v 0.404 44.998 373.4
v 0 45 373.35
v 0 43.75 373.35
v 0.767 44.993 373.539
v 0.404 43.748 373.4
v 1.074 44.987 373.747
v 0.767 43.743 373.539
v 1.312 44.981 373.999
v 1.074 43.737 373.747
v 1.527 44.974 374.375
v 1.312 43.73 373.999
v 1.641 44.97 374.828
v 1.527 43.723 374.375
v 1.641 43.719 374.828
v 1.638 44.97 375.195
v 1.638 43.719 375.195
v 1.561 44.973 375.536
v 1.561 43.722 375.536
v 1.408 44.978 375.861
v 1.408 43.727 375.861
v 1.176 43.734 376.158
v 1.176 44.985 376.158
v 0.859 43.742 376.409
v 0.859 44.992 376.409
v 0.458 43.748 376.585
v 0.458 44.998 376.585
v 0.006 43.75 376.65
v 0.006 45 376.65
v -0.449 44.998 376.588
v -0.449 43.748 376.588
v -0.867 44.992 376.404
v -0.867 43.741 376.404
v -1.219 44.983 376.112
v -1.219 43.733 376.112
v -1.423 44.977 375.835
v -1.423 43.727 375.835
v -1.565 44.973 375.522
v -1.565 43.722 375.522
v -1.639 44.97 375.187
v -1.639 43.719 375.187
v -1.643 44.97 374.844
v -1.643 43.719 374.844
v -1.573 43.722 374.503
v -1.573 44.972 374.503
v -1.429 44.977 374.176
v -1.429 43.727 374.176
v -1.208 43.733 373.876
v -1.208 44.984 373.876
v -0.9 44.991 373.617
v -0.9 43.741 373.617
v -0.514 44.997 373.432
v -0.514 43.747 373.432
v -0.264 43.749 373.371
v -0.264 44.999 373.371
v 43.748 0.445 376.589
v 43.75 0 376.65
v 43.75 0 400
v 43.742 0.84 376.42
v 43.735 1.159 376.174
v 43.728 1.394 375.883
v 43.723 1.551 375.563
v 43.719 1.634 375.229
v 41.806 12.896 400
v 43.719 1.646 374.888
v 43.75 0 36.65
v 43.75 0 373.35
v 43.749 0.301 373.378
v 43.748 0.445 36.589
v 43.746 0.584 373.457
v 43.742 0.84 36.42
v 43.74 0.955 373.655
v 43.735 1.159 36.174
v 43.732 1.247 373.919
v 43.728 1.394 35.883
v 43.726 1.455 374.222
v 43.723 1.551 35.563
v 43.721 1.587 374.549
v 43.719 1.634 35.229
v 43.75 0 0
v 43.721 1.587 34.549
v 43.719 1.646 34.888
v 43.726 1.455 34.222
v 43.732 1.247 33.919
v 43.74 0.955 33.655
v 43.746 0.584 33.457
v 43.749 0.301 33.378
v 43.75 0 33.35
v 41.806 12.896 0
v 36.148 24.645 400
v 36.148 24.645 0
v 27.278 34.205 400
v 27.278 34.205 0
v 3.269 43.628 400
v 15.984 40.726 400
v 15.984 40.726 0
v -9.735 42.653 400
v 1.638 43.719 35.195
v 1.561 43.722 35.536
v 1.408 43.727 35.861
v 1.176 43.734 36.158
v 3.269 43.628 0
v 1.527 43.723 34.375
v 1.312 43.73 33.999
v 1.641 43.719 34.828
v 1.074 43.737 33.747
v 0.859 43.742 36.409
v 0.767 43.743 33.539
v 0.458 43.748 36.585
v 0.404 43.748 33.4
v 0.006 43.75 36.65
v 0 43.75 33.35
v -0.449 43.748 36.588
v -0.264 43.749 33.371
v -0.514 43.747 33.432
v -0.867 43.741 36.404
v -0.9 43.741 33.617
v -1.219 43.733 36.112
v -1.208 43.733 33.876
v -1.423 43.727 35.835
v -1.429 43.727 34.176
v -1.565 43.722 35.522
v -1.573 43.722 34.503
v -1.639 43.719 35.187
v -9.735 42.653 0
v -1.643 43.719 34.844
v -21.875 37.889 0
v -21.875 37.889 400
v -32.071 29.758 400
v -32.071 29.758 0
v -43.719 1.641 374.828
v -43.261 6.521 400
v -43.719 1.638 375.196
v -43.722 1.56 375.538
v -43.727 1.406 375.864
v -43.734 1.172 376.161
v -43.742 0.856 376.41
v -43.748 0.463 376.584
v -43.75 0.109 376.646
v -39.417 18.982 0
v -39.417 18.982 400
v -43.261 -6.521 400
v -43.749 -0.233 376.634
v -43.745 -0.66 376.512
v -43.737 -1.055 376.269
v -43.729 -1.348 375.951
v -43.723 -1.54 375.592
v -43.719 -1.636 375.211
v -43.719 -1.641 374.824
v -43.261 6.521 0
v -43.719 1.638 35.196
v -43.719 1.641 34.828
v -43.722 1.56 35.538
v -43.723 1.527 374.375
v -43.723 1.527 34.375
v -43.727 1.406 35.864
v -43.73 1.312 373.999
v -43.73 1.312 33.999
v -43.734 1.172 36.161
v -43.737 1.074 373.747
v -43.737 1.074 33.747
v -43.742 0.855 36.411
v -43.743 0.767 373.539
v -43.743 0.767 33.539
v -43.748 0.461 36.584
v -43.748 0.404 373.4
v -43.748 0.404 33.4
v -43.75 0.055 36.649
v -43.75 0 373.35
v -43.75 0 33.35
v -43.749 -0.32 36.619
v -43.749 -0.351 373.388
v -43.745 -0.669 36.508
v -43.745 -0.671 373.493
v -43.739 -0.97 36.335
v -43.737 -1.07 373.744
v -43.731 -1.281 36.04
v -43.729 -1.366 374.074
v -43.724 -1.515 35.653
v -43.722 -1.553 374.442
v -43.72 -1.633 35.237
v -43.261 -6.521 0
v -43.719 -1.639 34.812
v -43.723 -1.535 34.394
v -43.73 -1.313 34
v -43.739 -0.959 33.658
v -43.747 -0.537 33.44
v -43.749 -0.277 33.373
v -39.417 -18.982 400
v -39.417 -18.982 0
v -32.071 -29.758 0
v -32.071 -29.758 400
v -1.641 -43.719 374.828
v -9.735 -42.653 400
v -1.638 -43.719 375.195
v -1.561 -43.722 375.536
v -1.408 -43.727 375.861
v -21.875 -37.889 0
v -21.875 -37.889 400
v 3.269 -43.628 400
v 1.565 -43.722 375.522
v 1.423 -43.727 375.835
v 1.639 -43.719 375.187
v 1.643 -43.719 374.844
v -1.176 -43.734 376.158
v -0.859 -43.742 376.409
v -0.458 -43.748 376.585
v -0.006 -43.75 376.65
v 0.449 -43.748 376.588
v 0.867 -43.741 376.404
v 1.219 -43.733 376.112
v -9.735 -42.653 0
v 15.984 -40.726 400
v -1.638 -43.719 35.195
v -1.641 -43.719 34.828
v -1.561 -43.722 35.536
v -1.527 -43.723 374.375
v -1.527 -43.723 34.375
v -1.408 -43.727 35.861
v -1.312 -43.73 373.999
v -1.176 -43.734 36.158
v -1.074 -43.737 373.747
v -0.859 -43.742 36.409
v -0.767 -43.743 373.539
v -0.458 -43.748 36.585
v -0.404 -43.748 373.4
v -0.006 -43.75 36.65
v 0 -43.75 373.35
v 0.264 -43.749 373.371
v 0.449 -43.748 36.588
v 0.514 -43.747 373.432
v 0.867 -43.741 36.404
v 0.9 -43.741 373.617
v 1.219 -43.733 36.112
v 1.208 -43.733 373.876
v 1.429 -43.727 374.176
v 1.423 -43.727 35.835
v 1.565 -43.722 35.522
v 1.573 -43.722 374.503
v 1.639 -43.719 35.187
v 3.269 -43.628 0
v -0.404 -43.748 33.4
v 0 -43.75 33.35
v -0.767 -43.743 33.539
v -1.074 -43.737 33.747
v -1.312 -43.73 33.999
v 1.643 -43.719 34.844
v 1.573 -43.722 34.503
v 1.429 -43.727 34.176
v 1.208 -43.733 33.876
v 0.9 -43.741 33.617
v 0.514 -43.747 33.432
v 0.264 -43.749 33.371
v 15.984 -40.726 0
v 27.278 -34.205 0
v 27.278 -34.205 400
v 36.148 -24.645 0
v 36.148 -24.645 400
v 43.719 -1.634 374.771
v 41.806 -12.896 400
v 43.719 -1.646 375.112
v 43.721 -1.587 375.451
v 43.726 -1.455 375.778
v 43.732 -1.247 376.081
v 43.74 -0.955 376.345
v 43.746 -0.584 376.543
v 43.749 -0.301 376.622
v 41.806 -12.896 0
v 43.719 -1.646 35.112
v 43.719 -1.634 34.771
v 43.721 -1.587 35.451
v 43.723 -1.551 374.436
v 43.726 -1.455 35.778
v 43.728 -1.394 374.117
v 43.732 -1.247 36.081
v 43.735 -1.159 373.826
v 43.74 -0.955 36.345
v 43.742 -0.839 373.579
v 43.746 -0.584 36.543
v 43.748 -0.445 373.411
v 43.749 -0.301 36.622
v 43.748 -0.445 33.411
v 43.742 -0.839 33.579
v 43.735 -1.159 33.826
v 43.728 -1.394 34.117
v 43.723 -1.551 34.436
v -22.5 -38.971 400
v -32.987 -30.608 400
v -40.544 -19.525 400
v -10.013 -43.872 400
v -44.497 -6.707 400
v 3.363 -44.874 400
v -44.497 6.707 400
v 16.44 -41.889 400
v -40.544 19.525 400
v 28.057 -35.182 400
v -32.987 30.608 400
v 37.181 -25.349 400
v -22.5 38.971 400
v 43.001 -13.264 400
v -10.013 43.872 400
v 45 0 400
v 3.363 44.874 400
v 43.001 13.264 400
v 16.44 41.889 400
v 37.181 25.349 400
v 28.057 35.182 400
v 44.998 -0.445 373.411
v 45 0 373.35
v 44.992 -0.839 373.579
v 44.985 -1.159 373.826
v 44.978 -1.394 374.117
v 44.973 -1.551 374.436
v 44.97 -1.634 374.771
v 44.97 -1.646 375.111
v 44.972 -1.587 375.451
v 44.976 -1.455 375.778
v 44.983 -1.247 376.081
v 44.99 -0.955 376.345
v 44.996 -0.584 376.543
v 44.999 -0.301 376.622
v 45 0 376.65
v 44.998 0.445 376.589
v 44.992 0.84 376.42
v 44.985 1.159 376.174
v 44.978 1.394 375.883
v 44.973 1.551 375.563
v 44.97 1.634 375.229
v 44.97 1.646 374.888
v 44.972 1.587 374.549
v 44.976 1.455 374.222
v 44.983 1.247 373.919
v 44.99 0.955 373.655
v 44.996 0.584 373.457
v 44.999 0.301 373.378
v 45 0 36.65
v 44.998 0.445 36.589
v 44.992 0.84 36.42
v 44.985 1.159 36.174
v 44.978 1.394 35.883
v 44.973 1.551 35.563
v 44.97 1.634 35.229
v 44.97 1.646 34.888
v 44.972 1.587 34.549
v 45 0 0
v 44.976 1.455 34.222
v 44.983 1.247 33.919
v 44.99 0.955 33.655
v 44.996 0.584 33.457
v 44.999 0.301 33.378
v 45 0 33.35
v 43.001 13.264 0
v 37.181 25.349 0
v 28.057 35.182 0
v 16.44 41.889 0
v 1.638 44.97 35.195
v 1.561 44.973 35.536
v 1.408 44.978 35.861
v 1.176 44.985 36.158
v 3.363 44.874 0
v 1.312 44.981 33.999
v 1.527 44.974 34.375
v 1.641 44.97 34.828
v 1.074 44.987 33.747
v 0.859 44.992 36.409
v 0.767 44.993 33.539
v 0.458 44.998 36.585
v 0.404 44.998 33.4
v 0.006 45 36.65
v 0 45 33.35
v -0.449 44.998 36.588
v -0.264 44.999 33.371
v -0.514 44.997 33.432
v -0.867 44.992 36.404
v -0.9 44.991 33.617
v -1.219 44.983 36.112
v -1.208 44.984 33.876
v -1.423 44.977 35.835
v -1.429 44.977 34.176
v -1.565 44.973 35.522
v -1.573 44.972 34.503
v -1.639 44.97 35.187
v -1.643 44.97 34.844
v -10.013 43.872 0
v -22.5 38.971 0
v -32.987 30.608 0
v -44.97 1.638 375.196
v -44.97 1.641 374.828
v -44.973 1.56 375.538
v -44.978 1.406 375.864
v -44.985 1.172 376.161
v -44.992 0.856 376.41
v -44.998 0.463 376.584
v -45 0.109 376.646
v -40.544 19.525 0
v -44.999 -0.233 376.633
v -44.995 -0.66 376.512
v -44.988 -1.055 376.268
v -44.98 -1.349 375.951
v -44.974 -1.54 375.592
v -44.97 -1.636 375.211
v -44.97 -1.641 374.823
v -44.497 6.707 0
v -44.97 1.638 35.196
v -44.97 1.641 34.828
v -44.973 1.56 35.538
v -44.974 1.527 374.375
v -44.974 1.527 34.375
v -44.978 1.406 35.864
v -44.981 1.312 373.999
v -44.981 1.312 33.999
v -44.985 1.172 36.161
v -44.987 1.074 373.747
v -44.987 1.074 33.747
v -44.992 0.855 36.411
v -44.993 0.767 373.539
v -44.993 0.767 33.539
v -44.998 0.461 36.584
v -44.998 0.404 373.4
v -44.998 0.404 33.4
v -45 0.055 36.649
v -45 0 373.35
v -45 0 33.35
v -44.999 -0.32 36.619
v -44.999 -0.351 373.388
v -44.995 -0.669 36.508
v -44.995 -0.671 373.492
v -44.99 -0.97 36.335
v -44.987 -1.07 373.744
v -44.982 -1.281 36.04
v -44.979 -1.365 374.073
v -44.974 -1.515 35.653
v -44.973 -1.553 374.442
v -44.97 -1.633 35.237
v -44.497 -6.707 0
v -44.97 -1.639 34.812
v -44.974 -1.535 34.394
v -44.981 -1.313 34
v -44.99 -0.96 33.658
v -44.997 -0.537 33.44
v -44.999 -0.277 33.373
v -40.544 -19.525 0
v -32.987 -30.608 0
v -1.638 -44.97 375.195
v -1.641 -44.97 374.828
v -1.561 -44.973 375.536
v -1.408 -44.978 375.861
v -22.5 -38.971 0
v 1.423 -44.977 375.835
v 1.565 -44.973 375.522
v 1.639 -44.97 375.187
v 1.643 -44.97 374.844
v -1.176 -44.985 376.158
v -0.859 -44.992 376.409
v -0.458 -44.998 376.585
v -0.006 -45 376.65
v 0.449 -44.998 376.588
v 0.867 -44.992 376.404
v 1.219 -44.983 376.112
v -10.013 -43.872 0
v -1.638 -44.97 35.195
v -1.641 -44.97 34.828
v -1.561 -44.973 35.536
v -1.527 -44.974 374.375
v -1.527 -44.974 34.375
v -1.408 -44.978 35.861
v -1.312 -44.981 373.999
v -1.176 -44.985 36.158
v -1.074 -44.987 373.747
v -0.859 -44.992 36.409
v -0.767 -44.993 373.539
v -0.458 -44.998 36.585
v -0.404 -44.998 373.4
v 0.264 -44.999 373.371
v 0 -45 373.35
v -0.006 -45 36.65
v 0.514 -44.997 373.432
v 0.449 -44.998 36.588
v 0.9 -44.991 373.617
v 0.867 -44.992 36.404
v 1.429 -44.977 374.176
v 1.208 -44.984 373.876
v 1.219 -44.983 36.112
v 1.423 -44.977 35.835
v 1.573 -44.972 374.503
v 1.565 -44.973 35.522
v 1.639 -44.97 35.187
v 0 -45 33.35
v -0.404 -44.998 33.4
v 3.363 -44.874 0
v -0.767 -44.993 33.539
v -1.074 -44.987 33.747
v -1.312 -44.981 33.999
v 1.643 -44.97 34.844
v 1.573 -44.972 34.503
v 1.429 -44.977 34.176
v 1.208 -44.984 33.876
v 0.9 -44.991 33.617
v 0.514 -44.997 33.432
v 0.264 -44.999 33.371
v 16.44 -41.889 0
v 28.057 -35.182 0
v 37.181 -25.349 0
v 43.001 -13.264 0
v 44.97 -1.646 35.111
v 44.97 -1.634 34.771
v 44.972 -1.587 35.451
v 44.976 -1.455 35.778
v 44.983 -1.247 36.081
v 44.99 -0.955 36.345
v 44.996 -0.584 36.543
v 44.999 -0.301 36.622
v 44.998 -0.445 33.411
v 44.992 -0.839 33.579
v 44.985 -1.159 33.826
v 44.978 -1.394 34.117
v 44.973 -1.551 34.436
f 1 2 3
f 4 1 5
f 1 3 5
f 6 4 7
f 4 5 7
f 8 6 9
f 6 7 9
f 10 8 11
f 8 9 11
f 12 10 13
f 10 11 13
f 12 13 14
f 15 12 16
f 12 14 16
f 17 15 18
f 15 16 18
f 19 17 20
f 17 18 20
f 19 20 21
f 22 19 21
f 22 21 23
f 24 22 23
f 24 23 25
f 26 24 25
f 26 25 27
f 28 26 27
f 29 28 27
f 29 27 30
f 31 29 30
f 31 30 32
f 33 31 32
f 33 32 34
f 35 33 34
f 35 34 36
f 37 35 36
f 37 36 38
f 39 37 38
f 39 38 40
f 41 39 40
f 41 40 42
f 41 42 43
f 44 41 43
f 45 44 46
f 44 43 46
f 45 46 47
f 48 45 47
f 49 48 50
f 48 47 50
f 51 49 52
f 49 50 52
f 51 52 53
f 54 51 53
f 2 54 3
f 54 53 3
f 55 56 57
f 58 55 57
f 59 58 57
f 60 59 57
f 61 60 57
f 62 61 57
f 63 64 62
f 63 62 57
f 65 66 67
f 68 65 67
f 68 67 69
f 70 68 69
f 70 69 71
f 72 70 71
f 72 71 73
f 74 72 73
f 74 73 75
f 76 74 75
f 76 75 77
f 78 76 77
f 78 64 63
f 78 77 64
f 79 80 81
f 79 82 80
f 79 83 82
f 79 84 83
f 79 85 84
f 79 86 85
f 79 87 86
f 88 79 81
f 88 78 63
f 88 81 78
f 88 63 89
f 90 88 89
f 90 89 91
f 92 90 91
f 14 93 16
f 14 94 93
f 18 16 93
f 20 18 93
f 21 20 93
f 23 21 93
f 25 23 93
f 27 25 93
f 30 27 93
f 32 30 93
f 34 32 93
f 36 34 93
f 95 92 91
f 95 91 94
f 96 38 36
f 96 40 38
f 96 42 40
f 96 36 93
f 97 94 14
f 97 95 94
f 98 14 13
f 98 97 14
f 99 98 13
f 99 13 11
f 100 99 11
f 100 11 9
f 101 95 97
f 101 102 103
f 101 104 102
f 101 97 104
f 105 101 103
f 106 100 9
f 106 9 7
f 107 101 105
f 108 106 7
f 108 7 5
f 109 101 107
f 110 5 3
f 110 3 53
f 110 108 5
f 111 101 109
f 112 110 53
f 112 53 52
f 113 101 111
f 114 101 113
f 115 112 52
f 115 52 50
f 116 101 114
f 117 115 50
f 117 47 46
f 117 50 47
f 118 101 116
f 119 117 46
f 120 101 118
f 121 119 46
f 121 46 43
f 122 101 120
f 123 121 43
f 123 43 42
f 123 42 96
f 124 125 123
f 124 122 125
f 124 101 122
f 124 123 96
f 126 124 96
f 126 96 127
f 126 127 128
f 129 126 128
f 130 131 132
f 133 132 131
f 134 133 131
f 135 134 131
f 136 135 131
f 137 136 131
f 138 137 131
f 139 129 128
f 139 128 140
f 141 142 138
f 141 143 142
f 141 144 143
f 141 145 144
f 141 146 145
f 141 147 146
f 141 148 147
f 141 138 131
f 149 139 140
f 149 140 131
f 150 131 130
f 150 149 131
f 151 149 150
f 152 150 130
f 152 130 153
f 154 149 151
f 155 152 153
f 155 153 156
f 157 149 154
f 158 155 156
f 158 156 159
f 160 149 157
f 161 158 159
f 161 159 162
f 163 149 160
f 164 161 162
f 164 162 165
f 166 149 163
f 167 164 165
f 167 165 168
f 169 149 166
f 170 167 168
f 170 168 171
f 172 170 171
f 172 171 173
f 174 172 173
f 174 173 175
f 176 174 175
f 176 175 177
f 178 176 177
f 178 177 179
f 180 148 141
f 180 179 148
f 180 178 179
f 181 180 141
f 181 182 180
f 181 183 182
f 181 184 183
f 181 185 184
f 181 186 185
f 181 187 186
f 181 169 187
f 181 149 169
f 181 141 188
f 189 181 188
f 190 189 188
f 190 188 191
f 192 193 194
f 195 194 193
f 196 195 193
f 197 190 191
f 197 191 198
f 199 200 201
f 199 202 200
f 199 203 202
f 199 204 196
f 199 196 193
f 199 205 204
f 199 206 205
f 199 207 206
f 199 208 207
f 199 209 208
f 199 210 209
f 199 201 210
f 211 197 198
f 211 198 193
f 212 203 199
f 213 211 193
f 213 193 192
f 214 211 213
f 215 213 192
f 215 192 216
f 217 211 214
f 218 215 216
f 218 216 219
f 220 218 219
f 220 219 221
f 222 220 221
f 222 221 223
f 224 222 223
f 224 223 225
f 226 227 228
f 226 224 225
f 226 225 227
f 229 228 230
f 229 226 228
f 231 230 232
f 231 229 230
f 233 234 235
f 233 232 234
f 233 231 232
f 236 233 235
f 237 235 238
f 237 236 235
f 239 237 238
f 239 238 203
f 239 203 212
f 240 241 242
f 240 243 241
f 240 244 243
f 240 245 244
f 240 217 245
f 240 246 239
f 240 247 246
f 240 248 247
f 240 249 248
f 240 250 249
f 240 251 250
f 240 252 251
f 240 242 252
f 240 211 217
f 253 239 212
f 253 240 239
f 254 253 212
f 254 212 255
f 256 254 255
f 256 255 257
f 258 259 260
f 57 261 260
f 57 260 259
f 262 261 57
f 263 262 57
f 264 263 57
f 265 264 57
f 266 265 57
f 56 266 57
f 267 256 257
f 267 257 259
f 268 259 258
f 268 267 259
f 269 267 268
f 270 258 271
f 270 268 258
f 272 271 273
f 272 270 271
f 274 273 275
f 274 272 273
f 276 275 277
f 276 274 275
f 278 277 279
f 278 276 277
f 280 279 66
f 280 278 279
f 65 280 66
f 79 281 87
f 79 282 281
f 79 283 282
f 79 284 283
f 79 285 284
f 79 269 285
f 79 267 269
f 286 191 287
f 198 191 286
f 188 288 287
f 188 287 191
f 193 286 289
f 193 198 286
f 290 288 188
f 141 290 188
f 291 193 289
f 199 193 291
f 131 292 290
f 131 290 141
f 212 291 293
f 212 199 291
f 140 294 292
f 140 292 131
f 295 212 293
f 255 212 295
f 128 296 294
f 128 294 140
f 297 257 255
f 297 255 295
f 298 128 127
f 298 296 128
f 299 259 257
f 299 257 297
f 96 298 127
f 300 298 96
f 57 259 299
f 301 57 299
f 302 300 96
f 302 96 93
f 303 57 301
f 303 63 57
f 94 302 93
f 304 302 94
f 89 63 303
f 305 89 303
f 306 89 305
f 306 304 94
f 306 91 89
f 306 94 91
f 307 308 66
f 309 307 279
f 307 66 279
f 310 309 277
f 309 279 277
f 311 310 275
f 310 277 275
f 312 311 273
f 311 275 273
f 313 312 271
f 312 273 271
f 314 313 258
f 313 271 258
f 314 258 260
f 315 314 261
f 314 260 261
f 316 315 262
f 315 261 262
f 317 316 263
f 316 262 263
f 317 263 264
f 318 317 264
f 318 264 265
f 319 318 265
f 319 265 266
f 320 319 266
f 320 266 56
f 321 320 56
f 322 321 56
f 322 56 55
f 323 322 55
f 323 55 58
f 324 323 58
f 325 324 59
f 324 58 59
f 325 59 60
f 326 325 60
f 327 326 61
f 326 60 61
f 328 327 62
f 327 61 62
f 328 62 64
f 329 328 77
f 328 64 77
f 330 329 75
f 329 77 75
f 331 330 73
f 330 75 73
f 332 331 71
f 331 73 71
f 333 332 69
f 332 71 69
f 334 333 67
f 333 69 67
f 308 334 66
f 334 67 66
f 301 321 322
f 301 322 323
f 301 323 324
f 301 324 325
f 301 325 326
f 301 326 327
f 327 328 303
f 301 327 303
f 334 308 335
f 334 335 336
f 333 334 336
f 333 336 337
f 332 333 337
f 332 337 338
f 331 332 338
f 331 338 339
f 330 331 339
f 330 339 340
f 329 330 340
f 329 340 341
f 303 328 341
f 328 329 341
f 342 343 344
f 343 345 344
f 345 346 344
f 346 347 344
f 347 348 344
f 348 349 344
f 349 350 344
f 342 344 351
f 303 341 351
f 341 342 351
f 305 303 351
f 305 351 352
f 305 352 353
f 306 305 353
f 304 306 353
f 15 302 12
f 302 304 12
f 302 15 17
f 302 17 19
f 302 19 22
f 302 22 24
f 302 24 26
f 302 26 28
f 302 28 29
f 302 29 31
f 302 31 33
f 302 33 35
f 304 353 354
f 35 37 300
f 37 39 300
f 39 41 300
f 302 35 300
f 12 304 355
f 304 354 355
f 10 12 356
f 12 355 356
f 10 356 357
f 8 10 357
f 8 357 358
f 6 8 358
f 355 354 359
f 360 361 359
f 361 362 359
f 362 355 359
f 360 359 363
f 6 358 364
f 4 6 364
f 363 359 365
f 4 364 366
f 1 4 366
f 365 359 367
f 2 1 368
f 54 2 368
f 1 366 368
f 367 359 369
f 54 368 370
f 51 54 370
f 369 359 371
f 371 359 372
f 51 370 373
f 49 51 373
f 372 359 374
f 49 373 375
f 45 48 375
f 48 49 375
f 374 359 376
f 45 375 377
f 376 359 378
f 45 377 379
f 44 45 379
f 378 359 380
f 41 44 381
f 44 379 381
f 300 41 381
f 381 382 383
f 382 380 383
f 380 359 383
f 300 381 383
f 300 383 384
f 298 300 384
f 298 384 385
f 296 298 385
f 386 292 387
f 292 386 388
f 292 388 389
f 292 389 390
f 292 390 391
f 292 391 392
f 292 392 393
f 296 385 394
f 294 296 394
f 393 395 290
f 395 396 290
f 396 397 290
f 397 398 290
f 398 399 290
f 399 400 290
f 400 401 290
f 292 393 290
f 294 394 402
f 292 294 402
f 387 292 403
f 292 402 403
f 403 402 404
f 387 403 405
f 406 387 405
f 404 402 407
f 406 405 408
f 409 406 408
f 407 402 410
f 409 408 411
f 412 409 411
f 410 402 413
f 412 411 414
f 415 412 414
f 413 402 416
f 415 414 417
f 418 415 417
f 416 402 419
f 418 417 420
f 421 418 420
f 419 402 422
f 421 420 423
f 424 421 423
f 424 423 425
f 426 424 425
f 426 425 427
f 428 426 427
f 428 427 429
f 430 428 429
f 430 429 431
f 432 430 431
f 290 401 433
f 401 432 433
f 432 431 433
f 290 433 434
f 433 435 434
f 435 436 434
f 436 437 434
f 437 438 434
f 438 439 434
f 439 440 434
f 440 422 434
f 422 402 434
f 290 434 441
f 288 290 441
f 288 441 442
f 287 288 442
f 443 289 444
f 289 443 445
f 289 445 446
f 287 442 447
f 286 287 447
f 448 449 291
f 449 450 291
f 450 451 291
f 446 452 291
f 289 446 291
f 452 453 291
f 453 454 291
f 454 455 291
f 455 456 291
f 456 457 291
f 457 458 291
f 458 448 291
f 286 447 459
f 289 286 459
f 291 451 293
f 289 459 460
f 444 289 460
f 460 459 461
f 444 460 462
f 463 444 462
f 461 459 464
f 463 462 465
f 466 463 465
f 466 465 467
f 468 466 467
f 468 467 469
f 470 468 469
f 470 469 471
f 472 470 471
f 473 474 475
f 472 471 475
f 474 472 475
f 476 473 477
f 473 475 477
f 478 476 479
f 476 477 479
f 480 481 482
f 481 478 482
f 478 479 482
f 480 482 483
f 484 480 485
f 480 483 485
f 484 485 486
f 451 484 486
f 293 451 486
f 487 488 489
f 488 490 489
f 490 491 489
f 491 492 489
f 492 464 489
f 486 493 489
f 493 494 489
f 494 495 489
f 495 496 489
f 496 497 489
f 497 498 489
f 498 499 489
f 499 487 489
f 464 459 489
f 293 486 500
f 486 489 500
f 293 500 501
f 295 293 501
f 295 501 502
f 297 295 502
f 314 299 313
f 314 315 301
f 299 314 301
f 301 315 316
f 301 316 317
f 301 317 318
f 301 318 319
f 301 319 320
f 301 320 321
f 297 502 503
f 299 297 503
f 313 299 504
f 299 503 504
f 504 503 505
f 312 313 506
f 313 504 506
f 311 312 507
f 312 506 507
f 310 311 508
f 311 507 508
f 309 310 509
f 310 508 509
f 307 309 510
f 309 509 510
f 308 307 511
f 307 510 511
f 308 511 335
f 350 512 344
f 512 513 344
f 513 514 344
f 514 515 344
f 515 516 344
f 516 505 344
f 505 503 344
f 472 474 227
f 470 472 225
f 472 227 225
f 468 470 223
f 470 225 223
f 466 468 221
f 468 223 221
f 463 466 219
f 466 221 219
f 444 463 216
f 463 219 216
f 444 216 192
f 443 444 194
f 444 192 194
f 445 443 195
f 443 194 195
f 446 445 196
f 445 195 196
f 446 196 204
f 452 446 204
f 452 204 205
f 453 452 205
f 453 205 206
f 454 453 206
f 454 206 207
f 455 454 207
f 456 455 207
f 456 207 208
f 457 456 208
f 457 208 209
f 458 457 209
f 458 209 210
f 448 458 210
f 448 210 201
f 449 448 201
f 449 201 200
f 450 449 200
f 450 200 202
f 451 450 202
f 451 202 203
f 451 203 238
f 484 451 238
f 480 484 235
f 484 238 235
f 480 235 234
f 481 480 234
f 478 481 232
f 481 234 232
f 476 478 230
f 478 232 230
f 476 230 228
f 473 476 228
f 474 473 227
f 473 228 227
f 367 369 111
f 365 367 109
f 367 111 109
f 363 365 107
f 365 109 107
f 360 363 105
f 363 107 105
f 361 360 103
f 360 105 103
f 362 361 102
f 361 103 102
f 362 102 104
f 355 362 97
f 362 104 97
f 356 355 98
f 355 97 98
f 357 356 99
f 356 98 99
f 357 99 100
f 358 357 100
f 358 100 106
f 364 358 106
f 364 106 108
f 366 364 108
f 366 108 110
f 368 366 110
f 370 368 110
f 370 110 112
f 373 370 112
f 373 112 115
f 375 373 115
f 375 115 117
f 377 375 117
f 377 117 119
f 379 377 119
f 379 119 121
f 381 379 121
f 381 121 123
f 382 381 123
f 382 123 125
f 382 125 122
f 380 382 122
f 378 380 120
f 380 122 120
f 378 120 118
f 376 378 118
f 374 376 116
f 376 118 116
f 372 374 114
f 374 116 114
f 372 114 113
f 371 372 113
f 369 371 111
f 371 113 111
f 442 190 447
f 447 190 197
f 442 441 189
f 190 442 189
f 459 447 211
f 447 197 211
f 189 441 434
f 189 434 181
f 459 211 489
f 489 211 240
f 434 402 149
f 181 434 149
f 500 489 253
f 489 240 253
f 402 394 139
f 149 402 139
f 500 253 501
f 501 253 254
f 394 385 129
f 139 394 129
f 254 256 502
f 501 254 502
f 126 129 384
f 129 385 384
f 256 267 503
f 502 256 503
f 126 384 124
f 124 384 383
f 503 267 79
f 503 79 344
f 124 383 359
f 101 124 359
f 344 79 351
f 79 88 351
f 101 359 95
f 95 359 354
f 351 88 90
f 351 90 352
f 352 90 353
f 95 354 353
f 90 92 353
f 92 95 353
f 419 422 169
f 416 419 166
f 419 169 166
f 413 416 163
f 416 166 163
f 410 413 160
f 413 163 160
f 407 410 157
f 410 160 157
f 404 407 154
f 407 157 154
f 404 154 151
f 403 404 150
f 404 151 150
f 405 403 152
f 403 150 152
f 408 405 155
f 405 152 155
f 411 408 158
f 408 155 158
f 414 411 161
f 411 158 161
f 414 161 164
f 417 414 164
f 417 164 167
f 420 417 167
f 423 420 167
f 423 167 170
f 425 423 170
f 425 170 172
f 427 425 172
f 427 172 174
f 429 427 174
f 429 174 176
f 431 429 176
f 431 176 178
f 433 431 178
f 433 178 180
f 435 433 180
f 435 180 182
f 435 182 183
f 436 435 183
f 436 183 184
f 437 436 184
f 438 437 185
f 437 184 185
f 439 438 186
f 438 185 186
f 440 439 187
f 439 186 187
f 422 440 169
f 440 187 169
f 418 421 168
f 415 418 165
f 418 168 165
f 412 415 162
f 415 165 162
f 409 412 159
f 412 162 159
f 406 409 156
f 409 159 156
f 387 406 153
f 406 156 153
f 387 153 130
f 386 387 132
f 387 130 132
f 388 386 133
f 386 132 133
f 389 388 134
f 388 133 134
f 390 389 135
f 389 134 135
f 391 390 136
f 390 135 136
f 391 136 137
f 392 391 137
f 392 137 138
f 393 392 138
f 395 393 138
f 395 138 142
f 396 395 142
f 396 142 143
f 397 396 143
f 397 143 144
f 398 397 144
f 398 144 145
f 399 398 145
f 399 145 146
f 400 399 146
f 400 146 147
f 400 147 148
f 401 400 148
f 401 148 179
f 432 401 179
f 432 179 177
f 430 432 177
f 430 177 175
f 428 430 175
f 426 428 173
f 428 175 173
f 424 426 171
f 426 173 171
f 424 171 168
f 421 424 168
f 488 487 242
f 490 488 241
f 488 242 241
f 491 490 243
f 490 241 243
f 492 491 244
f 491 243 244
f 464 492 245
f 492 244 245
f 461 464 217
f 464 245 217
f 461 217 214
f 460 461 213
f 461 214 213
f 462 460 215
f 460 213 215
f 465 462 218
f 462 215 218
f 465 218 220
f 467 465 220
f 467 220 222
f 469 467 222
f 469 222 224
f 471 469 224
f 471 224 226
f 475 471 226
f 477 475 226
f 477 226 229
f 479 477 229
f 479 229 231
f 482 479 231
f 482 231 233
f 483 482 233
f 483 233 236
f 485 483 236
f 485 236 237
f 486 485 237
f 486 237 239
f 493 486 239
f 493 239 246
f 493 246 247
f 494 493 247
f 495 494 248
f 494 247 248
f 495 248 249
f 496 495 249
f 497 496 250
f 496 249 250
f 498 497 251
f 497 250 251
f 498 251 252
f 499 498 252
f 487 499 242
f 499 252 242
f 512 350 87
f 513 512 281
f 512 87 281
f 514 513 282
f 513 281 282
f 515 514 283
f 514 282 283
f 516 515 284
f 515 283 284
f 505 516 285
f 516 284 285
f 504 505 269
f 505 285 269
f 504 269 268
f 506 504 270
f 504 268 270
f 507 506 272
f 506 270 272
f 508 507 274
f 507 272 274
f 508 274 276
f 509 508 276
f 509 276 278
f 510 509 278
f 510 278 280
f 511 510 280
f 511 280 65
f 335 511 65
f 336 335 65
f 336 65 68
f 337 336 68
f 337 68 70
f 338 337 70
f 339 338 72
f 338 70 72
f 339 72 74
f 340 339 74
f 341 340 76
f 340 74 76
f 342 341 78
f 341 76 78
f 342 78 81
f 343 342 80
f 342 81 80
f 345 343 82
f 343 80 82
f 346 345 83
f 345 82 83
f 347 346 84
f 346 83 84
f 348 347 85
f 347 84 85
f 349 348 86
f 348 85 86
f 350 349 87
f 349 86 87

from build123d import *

# Parameters (mm, degrees)
SKETCH1_R           = 45
SKETCH1_R_2         = 43.75
BOSS_EXTRUDE1_DEPTH = 400
SKETCH2_R           = 1.65
CUT_EXTRUDE1_DEPTH  = 406.030863022
CIRPATTERN1_COUNT   = 4


with BuildPart() as part:
    # Sketch1 → Boss-Extrude1 (new body)
    with BuildSketch(Plane.XY):
        Circle(SKETCH1_R)
        Circle(SKETCH1_R_2, mode=Mode.SUBTRACT)
    extrude(amount=BOSS_EXTRUDE1_DEPTH)

    # Sketch2 → Cut-Extrude1 (cut, through all)
    with BuildSketch(Plane(origin=(0, 0, 0), x_dir=(0, 0, -1), z_dir=(1, 0, 0))):
        with Locations((-35, 0)):
            Circle(SKETCH2_R)
        with Locations((-375, 0)):
            Circle(SKETCH2_R)
    cut_extrude1 = extrude(amount=-CUT_EXTRUDE1_DEPTH, mode=Mode.SUBTRACT)

    # CirPattern1: Cut-Extrude1 ×4 about axis
    cirpattern1_axis = Axis((0, 0, 400), (0, 0, -1))
    for i in range(1, CIRPATTERN1_COUNT):
        add(cut_extrude1.rotate(cirpattern1_axis, i * 360 / CIRPATTERN1_COUNT), mode=Mode.SUBTRACT)


solid = part.part
